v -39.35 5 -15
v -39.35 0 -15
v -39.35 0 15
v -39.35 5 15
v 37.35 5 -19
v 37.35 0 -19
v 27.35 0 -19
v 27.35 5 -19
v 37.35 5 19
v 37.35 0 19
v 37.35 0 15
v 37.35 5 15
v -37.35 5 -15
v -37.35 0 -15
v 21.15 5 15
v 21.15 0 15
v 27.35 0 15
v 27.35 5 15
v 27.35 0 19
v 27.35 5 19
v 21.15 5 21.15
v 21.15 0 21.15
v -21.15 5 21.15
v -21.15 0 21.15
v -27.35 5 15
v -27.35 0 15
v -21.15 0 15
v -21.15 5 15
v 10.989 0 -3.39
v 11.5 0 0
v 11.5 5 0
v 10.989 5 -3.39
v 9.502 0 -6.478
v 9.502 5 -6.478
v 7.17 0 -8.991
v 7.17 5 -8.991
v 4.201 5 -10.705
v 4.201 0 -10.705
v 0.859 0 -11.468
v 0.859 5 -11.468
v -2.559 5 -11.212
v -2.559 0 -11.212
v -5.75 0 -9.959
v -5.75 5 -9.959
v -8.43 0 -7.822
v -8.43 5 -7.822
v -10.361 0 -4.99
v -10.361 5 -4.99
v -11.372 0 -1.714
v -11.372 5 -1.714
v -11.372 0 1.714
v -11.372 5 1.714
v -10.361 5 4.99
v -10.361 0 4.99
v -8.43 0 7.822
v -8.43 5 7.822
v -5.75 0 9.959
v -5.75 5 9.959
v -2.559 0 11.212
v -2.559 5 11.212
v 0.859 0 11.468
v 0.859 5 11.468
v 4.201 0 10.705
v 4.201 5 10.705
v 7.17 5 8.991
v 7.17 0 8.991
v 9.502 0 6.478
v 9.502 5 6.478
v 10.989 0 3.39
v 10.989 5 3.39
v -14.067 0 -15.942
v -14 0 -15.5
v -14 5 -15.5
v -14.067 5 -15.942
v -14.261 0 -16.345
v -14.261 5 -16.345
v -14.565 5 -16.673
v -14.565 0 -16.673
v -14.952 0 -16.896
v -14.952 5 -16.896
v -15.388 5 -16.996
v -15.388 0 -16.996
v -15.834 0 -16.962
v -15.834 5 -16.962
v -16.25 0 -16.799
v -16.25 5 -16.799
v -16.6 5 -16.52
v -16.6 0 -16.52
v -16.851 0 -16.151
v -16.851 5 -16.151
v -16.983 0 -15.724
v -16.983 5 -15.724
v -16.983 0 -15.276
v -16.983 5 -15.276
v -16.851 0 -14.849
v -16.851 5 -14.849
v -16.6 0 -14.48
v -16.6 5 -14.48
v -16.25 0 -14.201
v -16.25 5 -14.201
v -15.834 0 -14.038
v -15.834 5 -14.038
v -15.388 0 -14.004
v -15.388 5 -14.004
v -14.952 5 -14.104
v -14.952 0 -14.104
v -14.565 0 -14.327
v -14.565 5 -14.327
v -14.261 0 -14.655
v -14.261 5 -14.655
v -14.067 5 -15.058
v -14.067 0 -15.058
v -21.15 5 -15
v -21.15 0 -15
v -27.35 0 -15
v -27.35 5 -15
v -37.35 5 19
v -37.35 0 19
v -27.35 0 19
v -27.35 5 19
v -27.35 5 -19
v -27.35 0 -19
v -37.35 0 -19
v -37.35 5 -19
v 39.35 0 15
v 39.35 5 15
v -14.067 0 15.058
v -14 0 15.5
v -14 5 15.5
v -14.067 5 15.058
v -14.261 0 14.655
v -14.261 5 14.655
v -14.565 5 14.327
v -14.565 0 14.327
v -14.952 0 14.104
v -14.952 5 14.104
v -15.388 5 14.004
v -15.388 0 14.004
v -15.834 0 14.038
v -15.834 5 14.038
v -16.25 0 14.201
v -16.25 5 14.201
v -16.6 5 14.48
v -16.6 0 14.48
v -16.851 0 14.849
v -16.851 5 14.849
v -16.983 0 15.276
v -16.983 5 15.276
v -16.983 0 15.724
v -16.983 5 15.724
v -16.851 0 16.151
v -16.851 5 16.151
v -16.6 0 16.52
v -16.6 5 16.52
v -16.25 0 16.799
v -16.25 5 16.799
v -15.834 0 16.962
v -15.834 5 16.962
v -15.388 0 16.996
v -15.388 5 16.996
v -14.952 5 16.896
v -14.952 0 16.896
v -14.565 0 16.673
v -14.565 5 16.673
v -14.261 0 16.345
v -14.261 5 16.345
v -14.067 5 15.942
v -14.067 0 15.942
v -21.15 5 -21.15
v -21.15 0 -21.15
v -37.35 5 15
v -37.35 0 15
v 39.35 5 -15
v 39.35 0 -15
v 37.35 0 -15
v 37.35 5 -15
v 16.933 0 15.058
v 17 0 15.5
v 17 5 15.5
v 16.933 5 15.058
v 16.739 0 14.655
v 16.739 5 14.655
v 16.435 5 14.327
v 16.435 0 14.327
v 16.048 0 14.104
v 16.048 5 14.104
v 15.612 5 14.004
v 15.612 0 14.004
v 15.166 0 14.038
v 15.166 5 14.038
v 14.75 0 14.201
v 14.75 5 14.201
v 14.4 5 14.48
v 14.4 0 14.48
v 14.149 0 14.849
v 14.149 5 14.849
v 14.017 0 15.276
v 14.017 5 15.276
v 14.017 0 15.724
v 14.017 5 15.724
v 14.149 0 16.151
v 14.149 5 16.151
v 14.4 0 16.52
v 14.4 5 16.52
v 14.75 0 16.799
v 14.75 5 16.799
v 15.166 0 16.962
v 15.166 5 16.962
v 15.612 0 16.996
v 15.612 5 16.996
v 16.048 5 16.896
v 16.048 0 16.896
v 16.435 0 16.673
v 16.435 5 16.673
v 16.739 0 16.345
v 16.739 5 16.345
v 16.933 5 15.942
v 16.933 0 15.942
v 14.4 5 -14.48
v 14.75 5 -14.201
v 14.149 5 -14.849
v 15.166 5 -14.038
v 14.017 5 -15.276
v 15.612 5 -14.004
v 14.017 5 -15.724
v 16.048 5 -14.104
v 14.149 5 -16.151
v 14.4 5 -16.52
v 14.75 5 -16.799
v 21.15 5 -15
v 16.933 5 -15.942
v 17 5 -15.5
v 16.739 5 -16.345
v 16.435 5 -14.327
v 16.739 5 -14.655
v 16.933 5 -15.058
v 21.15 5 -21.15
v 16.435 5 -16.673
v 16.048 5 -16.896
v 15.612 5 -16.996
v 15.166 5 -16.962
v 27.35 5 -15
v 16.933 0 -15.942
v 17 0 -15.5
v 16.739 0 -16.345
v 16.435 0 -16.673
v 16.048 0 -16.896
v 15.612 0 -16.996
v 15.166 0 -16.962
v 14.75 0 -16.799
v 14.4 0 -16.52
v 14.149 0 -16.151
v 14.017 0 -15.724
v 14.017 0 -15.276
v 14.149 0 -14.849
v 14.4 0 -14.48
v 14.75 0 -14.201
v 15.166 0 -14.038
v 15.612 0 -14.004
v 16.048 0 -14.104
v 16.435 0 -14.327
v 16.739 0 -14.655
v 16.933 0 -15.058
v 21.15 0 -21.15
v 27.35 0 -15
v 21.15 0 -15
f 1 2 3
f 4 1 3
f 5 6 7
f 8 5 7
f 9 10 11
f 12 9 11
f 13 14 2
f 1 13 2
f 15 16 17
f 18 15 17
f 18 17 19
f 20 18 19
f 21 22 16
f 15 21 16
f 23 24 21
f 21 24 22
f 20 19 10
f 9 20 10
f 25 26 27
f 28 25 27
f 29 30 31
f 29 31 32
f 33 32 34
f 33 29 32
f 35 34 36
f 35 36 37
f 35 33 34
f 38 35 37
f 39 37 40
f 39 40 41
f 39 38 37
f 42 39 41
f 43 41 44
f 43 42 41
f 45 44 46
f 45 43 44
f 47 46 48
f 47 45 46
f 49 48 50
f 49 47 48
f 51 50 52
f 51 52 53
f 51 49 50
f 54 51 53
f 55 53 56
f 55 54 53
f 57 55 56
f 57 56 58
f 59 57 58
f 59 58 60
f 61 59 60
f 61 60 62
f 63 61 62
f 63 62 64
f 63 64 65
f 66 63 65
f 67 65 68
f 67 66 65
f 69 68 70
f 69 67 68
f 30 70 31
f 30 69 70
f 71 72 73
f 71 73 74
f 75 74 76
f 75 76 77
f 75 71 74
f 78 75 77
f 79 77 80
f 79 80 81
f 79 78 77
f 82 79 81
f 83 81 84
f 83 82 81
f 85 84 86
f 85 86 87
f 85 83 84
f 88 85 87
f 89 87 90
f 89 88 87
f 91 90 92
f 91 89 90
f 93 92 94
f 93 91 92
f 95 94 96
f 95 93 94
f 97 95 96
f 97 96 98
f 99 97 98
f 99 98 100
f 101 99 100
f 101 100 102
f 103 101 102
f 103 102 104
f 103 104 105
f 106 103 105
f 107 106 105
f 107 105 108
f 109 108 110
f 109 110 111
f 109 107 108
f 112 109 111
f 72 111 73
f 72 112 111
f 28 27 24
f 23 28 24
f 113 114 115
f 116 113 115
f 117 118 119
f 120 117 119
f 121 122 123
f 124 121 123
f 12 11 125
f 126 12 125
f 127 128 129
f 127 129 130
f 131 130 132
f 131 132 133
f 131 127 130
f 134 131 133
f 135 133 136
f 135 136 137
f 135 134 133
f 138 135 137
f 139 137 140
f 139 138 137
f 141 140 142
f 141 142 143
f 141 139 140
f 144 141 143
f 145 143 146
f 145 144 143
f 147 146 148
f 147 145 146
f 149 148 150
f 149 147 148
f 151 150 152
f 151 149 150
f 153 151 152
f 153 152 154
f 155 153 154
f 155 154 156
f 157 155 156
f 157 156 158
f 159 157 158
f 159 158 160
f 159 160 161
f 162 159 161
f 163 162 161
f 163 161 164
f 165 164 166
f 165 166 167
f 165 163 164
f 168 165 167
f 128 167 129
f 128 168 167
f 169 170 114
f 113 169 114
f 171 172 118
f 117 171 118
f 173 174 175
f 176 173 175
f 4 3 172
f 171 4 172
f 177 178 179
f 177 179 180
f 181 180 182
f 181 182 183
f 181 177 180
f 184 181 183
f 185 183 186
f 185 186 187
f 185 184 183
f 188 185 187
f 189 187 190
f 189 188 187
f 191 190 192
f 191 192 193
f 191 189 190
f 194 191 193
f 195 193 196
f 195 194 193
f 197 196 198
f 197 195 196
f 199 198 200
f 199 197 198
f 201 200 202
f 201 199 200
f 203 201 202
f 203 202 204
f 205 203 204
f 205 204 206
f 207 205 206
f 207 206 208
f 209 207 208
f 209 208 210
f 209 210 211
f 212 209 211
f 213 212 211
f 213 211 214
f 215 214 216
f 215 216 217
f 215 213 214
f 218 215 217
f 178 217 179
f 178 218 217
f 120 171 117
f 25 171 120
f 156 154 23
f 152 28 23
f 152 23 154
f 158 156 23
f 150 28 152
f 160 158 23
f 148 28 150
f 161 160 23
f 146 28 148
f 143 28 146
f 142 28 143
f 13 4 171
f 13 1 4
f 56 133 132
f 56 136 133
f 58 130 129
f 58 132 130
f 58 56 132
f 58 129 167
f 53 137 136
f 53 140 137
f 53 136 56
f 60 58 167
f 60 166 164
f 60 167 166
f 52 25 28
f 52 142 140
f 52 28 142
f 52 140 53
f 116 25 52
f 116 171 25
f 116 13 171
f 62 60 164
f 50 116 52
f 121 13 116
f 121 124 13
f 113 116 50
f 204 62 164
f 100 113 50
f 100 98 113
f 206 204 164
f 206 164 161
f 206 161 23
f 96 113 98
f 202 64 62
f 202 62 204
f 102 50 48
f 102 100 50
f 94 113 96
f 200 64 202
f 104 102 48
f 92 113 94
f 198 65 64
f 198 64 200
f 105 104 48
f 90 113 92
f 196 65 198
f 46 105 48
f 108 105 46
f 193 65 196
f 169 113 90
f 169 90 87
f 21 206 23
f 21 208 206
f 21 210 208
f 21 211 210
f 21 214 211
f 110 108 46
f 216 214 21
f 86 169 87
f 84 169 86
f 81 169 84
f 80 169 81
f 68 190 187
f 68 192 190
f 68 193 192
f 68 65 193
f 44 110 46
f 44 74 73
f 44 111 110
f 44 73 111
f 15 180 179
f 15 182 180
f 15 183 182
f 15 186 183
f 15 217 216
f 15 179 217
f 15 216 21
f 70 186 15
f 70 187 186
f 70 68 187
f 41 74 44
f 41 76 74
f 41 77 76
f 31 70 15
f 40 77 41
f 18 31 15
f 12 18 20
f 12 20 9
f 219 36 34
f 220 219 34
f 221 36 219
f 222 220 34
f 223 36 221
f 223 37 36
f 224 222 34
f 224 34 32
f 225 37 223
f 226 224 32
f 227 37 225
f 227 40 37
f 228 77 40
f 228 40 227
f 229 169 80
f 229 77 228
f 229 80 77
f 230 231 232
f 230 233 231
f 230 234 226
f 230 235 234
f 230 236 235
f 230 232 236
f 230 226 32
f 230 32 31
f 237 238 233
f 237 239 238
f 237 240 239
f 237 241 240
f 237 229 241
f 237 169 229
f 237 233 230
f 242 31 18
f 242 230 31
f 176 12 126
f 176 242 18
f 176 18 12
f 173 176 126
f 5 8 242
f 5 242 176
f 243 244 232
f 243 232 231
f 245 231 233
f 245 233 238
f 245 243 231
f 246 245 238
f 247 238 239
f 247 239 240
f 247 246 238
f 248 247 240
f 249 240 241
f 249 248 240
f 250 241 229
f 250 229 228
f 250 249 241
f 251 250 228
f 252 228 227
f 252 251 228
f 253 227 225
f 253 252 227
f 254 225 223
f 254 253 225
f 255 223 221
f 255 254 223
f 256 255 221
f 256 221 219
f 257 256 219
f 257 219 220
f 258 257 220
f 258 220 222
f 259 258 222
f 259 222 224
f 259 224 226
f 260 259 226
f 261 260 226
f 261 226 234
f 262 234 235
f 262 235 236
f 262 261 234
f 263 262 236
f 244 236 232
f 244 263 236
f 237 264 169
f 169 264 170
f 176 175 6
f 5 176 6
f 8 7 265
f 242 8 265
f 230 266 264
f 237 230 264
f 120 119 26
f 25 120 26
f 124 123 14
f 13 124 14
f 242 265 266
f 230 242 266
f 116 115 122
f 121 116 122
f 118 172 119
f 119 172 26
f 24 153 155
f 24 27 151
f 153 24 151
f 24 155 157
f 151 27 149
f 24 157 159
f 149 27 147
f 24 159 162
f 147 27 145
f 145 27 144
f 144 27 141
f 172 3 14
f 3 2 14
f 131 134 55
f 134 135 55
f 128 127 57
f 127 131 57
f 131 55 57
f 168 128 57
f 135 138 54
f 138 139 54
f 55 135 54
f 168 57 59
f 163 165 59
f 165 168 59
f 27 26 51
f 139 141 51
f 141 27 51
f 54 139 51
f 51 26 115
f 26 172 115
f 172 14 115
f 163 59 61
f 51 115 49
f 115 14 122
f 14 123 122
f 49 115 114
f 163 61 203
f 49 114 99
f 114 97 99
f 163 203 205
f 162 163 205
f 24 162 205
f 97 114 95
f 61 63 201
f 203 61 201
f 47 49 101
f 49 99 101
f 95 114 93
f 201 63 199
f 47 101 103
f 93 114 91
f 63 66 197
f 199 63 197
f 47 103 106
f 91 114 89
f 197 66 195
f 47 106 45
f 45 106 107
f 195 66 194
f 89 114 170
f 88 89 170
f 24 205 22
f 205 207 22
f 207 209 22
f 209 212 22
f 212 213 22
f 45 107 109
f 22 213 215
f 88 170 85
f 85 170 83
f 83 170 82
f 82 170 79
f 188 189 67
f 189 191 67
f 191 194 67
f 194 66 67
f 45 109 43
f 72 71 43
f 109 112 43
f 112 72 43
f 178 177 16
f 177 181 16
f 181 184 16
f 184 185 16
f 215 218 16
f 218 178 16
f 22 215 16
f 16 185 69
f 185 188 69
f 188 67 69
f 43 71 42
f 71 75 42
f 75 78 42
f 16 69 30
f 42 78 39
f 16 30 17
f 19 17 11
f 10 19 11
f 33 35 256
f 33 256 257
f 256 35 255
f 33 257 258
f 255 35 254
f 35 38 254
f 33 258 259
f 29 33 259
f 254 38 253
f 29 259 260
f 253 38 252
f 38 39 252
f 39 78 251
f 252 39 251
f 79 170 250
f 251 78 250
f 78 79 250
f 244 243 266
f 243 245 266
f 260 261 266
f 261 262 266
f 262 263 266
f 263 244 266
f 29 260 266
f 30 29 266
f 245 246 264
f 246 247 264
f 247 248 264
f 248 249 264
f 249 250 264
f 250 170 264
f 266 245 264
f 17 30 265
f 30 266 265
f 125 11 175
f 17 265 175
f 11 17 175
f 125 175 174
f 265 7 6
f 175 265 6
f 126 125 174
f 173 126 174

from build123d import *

# Parameters (mm, degrees)
SKETCH1_R           = 11.5
SKETCH1_R_2         = 1.5
BOSS_EXTRUDE1_DEPTH = 5


with BuildPart() as part:
    # Sketch1 → Boss-Extrude1 (new body)
    with BuildSketch(Plane(origin=(0, 0, 0), x_dir=(1, 0, 0), z_dir=(0, 1, 0))):
        Polygon((-39.35, -15), (-37.35, -15), (-37.35, -19), (-27.35, -19), (-27.35, -15), (-21.15, -15), (-21.15, -21.15), (21.15, -21.15), (21.15, -15), (27.35, -15), (27.35, -19), (37.35, -19), (37.35, -15), (39.35, -15), (39.35, 15), (37.35, 15), (37.35, 19), (27.35, 19), (27.35, 15), (21.15, 15), (21.15, 21.15), (-21.15, 21.15), (-21.15, 15), (-27.35, 15), (-27.35, 19), (-37.35, 19), (-37.35, 15), (-39.35, 15), align=None)
        Circle(SKETCH1_R, mode=Mode.SUBTRACT)
        with Locations((15.5, 15.5)):
            Circle(SKETCH1_R_2, mode=Mode.SUBTRACT)
        with Locations((15.5, -15.5)):
            Circle(SKETCH1_R_2, mode=Mode.SUBTRACT)
        with Locations((-15.5, -15.5)):
            Circle(SKETCH1_R_2, mode=Mode.SUBTRACT)
        with Locations((-15.5, 15.5)):
            Circle(SKETCH1_R_2, mode=Mode.SUBTRACT)
    extrude(amount=BOSS_EXTRUDE1_DEPTH)


solid = part.part
